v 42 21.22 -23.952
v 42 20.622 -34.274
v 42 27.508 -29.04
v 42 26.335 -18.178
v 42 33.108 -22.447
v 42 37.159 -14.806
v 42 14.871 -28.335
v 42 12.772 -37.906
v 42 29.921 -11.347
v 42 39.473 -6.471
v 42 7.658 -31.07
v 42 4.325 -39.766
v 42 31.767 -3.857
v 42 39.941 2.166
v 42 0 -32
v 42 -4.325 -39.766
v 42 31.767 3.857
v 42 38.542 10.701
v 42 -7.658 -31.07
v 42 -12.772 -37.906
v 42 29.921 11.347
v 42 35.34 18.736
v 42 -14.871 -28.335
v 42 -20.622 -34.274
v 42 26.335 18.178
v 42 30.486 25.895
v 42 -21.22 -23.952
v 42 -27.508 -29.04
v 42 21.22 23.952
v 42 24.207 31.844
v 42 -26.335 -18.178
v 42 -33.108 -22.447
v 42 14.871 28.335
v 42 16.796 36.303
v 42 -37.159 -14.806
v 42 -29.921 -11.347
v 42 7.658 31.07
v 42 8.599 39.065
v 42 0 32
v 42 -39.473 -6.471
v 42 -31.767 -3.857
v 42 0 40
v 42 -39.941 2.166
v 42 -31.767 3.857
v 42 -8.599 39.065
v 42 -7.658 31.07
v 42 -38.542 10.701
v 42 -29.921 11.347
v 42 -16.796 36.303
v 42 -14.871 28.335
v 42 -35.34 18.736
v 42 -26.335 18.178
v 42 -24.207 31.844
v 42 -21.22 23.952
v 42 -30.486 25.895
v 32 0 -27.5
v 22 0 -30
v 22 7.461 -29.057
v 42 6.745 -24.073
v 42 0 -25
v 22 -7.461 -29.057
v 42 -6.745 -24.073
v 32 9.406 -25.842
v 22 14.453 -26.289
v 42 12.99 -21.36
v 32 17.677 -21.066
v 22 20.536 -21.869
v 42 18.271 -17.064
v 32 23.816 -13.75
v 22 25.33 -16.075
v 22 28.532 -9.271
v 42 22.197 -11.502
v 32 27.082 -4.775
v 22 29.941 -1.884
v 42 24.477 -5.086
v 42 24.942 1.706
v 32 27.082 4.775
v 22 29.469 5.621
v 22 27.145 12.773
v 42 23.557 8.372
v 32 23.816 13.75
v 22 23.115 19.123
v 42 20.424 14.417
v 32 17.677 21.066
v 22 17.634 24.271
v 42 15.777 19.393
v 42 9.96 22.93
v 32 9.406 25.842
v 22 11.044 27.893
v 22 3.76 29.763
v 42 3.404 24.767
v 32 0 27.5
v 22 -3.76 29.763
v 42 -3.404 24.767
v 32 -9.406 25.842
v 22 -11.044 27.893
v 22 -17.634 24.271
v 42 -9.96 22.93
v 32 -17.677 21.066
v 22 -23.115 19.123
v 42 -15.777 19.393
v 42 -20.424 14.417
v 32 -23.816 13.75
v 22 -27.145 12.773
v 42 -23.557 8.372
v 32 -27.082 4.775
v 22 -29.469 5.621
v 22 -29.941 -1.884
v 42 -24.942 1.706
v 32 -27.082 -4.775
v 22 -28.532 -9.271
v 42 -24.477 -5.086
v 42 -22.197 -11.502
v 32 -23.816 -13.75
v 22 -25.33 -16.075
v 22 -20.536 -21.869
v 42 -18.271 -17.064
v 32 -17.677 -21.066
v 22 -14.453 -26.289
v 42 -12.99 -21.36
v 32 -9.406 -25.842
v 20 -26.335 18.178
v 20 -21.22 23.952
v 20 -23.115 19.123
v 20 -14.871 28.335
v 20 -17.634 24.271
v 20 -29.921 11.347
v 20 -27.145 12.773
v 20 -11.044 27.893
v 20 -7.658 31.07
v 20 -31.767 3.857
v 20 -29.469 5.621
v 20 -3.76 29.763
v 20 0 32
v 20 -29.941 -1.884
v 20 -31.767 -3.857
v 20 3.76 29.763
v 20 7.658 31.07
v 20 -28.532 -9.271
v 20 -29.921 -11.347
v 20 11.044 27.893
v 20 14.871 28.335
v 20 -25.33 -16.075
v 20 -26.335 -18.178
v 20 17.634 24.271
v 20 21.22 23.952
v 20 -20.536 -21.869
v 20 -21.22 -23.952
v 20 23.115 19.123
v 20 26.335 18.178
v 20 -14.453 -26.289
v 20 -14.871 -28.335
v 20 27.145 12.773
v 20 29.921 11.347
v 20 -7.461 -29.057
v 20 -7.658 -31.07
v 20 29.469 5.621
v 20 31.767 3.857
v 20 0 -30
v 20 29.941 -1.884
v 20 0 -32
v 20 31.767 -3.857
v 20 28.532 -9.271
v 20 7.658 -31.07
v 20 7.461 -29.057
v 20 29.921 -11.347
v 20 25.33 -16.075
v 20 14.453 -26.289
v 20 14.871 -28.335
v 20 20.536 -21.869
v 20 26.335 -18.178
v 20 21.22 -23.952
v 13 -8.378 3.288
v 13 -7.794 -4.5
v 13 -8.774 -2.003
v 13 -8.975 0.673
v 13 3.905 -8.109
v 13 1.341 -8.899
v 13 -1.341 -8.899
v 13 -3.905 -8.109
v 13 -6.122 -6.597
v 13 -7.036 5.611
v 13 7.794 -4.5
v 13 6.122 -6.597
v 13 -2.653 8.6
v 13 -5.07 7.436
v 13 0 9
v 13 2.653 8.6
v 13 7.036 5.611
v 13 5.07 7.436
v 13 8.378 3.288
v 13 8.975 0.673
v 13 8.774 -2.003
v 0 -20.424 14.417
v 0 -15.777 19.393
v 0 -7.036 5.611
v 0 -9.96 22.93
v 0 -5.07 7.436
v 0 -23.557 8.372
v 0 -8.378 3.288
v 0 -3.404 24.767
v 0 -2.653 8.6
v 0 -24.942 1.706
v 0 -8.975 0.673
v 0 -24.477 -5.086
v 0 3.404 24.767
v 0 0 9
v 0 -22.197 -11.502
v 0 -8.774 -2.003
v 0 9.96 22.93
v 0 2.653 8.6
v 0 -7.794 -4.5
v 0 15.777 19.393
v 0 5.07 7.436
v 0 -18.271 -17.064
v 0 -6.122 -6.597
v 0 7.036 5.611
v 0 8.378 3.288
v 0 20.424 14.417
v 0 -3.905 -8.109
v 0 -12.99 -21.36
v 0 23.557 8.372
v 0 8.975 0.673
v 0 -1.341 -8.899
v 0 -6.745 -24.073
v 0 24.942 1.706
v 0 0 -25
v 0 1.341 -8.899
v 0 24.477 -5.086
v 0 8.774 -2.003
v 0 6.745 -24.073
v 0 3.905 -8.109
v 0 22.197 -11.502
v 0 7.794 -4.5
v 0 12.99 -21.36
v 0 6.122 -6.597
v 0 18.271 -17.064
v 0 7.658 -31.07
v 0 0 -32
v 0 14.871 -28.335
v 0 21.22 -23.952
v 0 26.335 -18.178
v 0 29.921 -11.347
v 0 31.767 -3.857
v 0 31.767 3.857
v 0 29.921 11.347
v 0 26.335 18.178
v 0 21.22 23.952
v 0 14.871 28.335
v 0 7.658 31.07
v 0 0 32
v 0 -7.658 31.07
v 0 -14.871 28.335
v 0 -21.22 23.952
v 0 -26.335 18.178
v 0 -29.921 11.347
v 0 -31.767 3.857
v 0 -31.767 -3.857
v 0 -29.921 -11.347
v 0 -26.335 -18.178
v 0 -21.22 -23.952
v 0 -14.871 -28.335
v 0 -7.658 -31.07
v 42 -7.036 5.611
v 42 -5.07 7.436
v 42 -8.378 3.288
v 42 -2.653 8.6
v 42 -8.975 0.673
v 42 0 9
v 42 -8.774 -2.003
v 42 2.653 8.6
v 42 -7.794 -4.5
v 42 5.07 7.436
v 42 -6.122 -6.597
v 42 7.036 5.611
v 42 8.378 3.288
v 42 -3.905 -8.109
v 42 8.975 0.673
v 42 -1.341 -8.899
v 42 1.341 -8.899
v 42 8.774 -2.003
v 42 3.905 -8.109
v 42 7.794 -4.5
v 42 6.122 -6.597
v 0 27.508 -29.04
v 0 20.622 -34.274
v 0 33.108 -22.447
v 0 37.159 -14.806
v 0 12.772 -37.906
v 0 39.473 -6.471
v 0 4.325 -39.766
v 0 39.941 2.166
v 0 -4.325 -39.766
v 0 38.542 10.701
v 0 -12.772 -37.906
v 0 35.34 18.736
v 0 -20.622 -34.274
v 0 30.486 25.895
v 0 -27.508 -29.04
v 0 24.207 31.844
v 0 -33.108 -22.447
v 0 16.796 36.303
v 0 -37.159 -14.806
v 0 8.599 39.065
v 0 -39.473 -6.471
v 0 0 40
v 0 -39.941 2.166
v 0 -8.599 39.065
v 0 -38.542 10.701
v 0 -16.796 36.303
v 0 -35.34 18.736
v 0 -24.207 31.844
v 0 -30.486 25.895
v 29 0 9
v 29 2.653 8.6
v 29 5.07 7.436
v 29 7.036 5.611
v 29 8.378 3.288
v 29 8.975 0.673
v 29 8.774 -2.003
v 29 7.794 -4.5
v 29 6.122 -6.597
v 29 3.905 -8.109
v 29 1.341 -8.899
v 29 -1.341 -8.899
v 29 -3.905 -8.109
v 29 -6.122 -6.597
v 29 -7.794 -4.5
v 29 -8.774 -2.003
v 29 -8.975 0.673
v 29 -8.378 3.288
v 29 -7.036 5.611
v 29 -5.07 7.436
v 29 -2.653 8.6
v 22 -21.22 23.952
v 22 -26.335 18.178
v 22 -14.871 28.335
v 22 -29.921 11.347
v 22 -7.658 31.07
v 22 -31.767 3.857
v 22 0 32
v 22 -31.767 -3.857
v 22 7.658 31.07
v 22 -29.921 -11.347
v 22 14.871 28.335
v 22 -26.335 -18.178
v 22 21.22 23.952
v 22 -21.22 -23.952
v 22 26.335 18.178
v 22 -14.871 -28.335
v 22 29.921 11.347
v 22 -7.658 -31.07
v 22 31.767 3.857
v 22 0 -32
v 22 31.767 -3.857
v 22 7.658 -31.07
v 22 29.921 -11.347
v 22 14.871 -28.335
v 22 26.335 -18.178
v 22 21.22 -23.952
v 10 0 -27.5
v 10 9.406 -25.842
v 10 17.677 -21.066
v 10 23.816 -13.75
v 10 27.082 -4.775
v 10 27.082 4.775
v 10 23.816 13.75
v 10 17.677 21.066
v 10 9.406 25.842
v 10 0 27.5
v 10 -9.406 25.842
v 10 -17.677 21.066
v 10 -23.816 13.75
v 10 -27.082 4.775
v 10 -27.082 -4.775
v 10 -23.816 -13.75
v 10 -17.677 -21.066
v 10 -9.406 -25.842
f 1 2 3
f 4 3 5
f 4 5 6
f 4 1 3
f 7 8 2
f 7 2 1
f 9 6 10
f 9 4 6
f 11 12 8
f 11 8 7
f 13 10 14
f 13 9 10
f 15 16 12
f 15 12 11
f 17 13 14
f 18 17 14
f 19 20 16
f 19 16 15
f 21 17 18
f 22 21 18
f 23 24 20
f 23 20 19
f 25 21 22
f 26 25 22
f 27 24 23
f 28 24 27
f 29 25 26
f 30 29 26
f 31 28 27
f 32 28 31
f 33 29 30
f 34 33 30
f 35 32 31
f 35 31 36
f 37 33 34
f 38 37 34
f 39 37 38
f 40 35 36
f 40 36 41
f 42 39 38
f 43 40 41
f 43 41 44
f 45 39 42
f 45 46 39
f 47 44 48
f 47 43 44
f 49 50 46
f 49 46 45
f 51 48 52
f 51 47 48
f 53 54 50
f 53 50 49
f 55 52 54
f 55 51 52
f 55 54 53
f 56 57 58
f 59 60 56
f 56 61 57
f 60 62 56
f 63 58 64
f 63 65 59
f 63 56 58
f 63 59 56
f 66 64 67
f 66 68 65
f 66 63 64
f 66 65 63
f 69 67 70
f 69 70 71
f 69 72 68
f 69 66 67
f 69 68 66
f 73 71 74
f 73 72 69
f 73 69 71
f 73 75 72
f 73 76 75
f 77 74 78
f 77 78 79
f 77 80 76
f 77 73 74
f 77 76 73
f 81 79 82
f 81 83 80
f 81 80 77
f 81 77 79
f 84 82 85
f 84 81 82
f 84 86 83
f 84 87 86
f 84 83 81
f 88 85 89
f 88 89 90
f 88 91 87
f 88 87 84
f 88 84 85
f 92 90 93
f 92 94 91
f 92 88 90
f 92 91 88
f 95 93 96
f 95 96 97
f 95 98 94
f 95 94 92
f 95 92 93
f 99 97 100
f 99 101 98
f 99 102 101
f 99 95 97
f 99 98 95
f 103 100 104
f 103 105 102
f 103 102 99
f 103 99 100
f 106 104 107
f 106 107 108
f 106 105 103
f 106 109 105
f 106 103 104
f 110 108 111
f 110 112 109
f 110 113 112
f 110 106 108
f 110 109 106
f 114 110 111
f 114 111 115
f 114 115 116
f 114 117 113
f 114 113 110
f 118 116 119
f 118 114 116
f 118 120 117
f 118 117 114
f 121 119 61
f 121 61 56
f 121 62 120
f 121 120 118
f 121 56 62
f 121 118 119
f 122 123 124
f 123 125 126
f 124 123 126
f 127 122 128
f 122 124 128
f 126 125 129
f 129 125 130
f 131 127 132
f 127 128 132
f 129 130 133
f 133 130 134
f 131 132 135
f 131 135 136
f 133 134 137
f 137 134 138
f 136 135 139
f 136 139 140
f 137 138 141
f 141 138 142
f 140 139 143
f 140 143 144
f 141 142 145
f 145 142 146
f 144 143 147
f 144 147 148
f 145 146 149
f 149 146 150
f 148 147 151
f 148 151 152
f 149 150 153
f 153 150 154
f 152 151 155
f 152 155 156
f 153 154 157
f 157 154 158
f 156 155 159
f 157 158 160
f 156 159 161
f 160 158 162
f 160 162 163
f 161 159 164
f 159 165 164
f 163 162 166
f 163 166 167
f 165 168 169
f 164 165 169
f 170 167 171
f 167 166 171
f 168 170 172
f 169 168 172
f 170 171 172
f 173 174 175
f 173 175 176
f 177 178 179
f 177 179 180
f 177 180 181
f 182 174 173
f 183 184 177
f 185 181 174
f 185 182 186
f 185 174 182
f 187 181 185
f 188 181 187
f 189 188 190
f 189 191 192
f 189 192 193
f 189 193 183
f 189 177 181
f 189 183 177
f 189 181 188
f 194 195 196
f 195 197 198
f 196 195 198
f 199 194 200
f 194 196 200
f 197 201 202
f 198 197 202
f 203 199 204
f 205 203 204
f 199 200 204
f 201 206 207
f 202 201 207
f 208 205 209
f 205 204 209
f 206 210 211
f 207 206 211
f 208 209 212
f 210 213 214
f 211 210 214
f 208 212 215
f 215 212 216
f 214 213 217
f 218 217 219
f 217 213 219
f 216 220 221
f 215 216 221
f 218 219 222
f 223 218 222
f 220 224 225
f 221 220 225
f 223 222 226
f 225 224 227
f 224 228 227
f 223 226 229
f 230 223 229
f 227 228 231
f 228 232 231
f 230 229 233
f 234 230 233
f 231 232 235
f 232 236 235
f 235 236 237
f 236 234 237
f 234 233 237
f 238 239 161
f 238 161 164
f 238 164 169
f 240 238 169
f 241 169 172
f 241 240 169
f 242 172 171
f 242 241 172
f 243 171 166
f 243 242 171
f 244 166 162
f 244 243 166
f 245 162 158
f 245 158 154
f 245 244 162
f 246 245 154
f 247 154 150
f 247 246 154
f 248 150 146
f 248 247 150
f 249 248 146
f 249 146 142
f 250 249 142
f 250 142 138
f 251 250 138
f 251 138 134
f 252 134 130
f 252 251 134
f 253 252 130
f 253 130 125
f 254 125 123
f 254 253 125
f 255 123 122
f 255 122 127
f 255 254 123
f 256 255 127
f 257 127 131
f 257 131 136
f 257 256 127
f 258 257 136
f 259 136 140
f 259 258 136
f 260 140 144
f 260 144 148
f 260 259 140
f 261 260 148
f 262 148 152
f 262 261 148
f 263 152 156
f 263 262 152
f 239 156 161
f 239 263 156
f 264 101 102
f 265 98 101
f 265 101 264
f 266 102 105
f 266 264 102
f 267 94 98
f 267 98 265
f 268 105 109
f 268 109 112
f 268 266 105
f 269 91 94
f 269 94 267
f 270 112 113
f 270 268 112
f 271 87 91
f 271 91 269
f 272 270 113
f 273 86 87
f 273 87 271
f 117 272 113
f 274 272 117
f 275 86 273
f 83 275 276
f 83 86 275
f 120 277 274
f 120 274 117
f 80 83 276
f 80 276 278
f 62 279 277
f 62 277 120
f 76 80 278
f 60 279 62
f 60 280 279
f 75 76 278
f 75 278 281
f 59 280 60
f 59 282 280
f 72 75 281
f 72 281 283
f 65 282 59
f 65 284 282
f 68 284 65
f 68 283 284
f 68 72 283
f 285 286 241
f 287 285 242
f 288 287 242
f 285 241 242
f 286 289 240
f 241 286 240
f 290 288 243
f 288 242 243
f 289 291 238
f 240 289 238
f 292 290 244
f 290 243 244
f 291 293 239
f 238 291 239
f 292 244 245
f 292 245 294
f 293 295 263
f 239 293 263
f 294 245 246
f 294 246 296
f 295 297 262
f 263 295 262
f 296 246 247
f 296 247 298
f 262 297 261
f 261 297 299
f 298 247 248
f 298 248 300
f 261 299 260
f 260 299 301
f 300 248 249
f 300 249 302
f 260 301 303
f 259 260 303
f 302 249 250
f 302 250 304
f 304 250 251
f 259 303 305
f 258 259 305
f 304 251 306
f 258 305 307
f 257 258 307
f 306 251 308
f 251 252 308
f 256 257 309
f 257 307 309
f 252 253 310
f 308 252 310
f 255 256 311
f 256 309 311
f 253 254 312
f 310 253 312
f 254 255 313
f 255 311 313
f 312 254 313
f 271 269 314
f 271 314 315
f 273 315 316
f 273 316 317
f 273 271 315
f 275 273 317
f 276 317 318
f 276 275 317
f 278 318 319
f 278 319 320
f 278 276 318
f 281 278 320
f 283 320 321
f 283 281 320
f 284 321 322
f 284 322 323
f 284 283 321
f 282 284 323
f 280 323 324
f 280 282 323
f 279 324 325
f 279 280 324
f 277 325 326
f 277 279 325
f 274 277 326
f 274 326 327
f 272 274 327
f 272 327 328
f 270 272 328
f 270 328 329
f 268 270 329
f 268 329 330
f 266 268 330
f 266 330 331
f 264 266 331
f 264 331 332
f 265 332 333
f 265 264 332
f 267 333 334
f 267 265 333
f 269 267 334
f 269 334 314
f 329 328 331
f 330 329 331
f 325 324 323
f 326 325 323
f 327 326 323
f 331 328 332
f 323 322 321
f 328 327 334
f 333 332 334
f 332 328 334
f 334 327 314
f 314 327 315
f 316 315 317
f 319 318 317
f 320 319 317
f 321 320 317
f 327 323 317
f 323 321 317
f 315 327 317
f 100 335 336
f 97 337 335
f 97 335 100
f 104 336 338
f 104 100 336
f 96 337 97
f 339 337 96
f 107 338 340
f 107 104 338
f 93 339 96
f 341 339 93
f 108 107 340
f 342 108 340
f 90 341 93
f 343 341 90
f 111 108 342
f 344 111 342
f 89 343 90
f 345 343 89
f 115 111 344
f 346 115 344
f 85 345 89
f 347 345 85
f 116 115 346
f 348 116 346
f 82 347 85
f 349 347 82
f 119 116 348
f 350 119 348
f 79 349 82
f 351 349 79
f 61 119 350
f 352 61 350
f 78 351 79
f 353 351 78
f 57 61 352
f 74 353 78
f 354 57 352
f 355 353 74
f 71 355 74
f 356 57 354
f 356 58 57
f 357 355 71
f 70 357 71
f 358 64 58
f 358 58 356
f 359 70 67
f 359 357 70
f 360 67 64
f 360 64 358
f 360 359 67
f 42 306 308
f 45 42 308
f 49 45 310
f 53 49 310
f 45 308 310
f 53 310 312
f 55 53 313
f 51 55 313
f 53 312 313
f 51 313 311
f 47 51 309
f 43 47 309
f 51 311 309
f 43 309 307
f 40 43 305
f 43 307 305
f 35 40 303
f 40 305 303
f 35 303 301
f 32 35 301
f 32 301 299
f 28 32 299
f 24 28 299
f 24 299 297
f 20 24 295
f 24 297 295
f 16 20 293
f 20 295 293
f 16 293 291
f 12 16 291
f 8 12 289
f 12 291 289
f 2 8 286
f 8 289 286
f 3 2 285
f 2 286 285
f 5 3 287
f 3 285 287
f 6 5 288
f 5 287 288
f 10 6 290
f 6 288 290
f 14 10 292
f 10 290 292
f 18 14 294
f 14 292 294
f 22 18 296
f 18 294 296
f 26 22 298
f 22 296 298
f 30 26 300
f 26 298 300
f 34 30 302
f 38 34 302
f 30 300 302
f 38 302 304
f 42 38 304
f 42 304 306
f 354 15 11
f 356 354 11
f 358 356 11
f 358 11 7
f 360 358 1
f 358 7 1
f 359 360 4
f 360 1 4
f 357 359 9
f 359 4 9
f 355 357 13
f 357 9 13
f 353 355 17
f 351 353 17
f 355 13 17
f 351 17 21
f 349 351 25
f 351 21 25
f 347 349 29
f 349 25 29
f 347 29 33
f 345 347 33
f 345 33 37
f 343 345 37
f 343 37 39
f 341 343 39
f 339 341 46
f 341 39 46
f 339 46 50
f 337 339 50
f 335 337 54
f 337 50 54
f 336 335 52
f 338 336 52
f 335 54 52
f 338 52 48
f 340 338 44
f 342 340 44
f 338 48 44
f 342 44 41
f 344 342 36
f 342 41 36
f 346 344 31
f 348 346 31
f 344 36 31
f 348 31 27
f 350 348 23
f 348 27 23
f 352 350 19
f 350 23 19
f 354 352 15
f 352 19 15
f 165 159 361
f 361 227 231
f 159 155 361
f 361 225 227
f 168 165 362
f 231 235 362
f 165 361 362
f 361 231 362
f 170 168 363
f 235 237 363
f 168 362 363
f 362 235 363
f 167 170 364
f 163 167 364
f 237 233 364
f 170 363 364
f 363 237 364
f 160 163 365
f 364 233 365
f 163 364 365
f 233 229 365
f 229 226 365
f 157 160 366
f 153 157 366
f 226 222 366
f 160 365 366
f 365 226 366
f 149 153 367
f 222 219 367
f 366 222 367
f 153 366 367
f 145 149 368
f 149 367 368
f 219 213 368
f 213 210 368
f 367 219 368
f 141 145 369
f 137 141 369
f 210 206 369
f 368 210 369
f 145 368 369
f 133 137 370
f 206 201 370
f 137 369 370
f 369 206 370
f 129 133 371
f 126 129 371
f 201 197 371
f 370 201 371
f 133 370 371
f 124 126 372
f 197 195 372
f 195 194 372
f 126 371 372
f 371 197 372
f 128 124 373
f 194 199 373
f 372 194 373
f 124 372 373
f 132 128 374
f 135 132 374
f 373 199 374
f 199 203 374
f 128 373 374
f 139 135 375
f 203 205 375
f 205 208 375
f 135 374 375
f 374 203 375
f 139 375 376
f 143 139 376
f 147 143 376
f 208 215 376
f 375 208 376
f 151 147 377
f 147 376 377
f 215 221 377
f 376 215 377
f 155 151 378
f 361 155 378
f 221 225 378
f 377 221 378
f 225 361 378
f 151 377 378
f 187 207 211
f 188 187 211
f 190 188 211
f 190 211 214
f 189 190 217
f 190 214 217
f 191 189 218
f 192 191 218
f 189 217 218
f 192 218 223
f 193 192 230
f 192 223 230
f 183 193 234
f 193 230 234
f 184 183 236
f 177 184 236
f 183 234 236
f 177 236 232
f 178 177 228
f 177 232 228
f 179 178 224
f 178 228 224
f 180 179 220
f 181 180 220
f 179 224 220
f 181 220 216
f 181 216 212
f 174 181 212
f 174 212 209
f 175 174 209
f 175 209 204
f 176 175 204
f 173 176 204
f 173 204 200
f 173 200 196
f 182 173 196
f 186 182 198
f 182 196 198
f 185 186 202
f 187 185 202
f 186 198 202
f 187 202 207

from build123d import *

# Parameters (mm, degrees)
SKETCH1_R           = 40
BOSS_EXTRUDE1_DEPTH = 42
SKETCH3_R           = 32
CUT_EXTRUDE2_DEPTH  = 20
SKETCH6_R           = 30
SKETCH5_R           = 25
SKETCH2_R           = 9
CUT_EXTRUDE4_DEPTH  = 13


with BuildPart() as part:
    # Sketch1 → Boss-Extrude1 (new body)
    with BuildSketch(Plane(origin=(0, 0, 0), x_dir=(0, 0, -1), z_dir=(1, 0, 0))):
        with Locations(Location((0, 0, 0), (0, 0, 180))):
            Circle(SKETCH1_R)
    extrude(amount=BOSS_EXTRUDE1_DEPTH)

    # Sketch3 → Cut-Extrude2 (cut)
    with BuildSketch(Plane(origin=(42, 0, 0), x_dir=(0, 0, -1), z_dir=(1, 0, 0))):
        Circle(SKETCH3_R)
    cut_extrude2 = extrude(amount=-CUT_EXTRUDE2_DEPTH, mode=Mode.SUBTRACT)

    # Sketch6 → Loft1 section 0
    with BuildSketch(Plane(origin=(22, 0, 0), x_dir=(0, 0, -1), z_dir=(1, 0, 0))):
        Circle(SKETCH6_R)
    # Sketch5 → Loft1 section 1
    with BuildSketch(Plane(origin=(42, 0, 0), x_dir=(0, 0, -1), z_dir=(1, 0, 0))):
        Circle(SKETCH5_R)
    loft1 = loft()

    # Mirror5: Cut-Extrude2, Loft1 across plane
    add(cut_extrude2.mirror(Plane(origin=(21, 0, 0), x_dir=(0, 0, 1), z_dir=(1, 0, 0))), mode=Mode.SUBTRACT)
    add(loft1.mirror(Plane(origin=(21, 0, 0), x_dir=(0, 0, 1), z_dir=(1, 0, 0))))

    # Sketch2 → Cut-Extrude4 (cut)
    with BuildSketch(Plane.ZY):
        Circle(SKETCH2_R)
    cut_extrude4 = extrude(amount=-CUT_EXTRUDE4_DEPTH, mode=Mode.SUBTRACT)

    # Mirror6: Cut-Extrude4 across plane
    add(cut_extrude4.mirror(Plane(origin=(21, 0, 0), x_dir=(0, 0, 1), z_dir=(1, 0, 0))), mode=Mode.SUBTRACT)


solid = part.part
